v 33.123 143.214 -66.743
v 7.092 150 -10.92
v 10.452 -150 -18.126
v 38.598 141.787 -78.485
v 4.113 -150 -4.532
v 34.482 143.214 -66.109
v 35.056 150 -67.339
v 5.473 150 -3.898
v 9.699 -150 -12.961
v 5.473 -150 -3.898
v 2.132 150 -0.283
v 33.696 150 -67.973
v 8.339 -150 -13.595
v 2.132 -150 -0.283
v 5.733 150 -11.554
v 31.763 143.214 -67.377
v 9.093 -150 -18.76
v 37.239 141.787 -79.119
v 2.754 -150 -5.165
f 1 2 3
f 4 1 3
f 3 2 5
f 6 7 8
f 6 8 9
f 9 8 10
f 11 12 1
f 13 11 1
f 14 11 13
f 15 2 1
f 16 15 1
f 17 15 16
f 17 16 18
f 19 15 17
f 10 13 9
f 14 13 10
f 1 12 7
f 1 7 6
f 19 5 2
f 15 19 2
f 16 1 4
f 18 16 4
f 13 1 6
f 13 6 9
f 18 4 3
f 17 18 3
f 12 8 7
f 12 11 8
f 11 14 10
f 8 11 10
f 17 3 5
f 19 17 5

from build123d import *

# Parameters (mm, degrees)
F3_DEPTH    = 1.5
F4_DEPTH    = 1.5
F5_T1_DEPTH = 325.9542136725


# Not quite as in the source:
# - a fillet or chamfer that OpenCascade refuses, or shapes differently, is made with other operations: its cross-section is extruded or revolved along the edge and cut away or added


with BuildPart() as f3:
    # F2 (on line) → F3 (new body)
    with BuildSketch(Plane(origin=(1.6427876097, 0, 0.7660444431), x_dir=(0, -1, 0), z_dir=(-0.906307787, 0, -0.4226182617))):
        Polygon((150, -5.8452365235), (150, -0.8452365235), (-150, -0.8452365235), (-150, -12.8946734447), align=None)
        Polygon((-143.2140751153, -74.4880515465), (-150, -12.8946734447), (-150, -75.8452365235), align=None)
        Polygon((150, -15.8452365235), (150, -5.8452365235), (-150, -12.8946734447), (-143.2140751153, -74.4880515465), align=None)
    extrude(amount=-F3_DEPTH)

    # F5: chamfer of 1.6 x 5 on 1 edges, made by hand

    # F5_s2 → F5_t1 (cut)
    with BuildSketch(Plane.XZ.offset(-162.9771068363)):
        Polygon((1.9093692213, -0.0422618262), (5.4725529893, -3.8976115426), (3.3594616806, 0.6339273926), align=None)
    extrude(amount=F5_T1_DEPTH, mode=Mode.SUBTRACT)


with BuildPart() as f4:
    # F2 (on line) → F4 (new body)
    with BuildSketch(Plane(origin=(1.6427876097, 0, 0.7660444431), x_dir=(0, -1, 0), z_dir=(-0.906307787, 0, -0.4226182617))):
        Polygon((150, -20.8452365235), (150, -15.8452365235), (-143.2140751153, -74.4880515465), (-141.7867242303, -87.4435976565), align=None)
        Polygon((150, -15.8452365235), (150, -5.8452365235), (-150, -12.8946734447), (-143.2140751153, -74.4880515465), align=None)
    extrude(amount=F4_DEPTH)


solid = Compound([f3.part, f4.part])
